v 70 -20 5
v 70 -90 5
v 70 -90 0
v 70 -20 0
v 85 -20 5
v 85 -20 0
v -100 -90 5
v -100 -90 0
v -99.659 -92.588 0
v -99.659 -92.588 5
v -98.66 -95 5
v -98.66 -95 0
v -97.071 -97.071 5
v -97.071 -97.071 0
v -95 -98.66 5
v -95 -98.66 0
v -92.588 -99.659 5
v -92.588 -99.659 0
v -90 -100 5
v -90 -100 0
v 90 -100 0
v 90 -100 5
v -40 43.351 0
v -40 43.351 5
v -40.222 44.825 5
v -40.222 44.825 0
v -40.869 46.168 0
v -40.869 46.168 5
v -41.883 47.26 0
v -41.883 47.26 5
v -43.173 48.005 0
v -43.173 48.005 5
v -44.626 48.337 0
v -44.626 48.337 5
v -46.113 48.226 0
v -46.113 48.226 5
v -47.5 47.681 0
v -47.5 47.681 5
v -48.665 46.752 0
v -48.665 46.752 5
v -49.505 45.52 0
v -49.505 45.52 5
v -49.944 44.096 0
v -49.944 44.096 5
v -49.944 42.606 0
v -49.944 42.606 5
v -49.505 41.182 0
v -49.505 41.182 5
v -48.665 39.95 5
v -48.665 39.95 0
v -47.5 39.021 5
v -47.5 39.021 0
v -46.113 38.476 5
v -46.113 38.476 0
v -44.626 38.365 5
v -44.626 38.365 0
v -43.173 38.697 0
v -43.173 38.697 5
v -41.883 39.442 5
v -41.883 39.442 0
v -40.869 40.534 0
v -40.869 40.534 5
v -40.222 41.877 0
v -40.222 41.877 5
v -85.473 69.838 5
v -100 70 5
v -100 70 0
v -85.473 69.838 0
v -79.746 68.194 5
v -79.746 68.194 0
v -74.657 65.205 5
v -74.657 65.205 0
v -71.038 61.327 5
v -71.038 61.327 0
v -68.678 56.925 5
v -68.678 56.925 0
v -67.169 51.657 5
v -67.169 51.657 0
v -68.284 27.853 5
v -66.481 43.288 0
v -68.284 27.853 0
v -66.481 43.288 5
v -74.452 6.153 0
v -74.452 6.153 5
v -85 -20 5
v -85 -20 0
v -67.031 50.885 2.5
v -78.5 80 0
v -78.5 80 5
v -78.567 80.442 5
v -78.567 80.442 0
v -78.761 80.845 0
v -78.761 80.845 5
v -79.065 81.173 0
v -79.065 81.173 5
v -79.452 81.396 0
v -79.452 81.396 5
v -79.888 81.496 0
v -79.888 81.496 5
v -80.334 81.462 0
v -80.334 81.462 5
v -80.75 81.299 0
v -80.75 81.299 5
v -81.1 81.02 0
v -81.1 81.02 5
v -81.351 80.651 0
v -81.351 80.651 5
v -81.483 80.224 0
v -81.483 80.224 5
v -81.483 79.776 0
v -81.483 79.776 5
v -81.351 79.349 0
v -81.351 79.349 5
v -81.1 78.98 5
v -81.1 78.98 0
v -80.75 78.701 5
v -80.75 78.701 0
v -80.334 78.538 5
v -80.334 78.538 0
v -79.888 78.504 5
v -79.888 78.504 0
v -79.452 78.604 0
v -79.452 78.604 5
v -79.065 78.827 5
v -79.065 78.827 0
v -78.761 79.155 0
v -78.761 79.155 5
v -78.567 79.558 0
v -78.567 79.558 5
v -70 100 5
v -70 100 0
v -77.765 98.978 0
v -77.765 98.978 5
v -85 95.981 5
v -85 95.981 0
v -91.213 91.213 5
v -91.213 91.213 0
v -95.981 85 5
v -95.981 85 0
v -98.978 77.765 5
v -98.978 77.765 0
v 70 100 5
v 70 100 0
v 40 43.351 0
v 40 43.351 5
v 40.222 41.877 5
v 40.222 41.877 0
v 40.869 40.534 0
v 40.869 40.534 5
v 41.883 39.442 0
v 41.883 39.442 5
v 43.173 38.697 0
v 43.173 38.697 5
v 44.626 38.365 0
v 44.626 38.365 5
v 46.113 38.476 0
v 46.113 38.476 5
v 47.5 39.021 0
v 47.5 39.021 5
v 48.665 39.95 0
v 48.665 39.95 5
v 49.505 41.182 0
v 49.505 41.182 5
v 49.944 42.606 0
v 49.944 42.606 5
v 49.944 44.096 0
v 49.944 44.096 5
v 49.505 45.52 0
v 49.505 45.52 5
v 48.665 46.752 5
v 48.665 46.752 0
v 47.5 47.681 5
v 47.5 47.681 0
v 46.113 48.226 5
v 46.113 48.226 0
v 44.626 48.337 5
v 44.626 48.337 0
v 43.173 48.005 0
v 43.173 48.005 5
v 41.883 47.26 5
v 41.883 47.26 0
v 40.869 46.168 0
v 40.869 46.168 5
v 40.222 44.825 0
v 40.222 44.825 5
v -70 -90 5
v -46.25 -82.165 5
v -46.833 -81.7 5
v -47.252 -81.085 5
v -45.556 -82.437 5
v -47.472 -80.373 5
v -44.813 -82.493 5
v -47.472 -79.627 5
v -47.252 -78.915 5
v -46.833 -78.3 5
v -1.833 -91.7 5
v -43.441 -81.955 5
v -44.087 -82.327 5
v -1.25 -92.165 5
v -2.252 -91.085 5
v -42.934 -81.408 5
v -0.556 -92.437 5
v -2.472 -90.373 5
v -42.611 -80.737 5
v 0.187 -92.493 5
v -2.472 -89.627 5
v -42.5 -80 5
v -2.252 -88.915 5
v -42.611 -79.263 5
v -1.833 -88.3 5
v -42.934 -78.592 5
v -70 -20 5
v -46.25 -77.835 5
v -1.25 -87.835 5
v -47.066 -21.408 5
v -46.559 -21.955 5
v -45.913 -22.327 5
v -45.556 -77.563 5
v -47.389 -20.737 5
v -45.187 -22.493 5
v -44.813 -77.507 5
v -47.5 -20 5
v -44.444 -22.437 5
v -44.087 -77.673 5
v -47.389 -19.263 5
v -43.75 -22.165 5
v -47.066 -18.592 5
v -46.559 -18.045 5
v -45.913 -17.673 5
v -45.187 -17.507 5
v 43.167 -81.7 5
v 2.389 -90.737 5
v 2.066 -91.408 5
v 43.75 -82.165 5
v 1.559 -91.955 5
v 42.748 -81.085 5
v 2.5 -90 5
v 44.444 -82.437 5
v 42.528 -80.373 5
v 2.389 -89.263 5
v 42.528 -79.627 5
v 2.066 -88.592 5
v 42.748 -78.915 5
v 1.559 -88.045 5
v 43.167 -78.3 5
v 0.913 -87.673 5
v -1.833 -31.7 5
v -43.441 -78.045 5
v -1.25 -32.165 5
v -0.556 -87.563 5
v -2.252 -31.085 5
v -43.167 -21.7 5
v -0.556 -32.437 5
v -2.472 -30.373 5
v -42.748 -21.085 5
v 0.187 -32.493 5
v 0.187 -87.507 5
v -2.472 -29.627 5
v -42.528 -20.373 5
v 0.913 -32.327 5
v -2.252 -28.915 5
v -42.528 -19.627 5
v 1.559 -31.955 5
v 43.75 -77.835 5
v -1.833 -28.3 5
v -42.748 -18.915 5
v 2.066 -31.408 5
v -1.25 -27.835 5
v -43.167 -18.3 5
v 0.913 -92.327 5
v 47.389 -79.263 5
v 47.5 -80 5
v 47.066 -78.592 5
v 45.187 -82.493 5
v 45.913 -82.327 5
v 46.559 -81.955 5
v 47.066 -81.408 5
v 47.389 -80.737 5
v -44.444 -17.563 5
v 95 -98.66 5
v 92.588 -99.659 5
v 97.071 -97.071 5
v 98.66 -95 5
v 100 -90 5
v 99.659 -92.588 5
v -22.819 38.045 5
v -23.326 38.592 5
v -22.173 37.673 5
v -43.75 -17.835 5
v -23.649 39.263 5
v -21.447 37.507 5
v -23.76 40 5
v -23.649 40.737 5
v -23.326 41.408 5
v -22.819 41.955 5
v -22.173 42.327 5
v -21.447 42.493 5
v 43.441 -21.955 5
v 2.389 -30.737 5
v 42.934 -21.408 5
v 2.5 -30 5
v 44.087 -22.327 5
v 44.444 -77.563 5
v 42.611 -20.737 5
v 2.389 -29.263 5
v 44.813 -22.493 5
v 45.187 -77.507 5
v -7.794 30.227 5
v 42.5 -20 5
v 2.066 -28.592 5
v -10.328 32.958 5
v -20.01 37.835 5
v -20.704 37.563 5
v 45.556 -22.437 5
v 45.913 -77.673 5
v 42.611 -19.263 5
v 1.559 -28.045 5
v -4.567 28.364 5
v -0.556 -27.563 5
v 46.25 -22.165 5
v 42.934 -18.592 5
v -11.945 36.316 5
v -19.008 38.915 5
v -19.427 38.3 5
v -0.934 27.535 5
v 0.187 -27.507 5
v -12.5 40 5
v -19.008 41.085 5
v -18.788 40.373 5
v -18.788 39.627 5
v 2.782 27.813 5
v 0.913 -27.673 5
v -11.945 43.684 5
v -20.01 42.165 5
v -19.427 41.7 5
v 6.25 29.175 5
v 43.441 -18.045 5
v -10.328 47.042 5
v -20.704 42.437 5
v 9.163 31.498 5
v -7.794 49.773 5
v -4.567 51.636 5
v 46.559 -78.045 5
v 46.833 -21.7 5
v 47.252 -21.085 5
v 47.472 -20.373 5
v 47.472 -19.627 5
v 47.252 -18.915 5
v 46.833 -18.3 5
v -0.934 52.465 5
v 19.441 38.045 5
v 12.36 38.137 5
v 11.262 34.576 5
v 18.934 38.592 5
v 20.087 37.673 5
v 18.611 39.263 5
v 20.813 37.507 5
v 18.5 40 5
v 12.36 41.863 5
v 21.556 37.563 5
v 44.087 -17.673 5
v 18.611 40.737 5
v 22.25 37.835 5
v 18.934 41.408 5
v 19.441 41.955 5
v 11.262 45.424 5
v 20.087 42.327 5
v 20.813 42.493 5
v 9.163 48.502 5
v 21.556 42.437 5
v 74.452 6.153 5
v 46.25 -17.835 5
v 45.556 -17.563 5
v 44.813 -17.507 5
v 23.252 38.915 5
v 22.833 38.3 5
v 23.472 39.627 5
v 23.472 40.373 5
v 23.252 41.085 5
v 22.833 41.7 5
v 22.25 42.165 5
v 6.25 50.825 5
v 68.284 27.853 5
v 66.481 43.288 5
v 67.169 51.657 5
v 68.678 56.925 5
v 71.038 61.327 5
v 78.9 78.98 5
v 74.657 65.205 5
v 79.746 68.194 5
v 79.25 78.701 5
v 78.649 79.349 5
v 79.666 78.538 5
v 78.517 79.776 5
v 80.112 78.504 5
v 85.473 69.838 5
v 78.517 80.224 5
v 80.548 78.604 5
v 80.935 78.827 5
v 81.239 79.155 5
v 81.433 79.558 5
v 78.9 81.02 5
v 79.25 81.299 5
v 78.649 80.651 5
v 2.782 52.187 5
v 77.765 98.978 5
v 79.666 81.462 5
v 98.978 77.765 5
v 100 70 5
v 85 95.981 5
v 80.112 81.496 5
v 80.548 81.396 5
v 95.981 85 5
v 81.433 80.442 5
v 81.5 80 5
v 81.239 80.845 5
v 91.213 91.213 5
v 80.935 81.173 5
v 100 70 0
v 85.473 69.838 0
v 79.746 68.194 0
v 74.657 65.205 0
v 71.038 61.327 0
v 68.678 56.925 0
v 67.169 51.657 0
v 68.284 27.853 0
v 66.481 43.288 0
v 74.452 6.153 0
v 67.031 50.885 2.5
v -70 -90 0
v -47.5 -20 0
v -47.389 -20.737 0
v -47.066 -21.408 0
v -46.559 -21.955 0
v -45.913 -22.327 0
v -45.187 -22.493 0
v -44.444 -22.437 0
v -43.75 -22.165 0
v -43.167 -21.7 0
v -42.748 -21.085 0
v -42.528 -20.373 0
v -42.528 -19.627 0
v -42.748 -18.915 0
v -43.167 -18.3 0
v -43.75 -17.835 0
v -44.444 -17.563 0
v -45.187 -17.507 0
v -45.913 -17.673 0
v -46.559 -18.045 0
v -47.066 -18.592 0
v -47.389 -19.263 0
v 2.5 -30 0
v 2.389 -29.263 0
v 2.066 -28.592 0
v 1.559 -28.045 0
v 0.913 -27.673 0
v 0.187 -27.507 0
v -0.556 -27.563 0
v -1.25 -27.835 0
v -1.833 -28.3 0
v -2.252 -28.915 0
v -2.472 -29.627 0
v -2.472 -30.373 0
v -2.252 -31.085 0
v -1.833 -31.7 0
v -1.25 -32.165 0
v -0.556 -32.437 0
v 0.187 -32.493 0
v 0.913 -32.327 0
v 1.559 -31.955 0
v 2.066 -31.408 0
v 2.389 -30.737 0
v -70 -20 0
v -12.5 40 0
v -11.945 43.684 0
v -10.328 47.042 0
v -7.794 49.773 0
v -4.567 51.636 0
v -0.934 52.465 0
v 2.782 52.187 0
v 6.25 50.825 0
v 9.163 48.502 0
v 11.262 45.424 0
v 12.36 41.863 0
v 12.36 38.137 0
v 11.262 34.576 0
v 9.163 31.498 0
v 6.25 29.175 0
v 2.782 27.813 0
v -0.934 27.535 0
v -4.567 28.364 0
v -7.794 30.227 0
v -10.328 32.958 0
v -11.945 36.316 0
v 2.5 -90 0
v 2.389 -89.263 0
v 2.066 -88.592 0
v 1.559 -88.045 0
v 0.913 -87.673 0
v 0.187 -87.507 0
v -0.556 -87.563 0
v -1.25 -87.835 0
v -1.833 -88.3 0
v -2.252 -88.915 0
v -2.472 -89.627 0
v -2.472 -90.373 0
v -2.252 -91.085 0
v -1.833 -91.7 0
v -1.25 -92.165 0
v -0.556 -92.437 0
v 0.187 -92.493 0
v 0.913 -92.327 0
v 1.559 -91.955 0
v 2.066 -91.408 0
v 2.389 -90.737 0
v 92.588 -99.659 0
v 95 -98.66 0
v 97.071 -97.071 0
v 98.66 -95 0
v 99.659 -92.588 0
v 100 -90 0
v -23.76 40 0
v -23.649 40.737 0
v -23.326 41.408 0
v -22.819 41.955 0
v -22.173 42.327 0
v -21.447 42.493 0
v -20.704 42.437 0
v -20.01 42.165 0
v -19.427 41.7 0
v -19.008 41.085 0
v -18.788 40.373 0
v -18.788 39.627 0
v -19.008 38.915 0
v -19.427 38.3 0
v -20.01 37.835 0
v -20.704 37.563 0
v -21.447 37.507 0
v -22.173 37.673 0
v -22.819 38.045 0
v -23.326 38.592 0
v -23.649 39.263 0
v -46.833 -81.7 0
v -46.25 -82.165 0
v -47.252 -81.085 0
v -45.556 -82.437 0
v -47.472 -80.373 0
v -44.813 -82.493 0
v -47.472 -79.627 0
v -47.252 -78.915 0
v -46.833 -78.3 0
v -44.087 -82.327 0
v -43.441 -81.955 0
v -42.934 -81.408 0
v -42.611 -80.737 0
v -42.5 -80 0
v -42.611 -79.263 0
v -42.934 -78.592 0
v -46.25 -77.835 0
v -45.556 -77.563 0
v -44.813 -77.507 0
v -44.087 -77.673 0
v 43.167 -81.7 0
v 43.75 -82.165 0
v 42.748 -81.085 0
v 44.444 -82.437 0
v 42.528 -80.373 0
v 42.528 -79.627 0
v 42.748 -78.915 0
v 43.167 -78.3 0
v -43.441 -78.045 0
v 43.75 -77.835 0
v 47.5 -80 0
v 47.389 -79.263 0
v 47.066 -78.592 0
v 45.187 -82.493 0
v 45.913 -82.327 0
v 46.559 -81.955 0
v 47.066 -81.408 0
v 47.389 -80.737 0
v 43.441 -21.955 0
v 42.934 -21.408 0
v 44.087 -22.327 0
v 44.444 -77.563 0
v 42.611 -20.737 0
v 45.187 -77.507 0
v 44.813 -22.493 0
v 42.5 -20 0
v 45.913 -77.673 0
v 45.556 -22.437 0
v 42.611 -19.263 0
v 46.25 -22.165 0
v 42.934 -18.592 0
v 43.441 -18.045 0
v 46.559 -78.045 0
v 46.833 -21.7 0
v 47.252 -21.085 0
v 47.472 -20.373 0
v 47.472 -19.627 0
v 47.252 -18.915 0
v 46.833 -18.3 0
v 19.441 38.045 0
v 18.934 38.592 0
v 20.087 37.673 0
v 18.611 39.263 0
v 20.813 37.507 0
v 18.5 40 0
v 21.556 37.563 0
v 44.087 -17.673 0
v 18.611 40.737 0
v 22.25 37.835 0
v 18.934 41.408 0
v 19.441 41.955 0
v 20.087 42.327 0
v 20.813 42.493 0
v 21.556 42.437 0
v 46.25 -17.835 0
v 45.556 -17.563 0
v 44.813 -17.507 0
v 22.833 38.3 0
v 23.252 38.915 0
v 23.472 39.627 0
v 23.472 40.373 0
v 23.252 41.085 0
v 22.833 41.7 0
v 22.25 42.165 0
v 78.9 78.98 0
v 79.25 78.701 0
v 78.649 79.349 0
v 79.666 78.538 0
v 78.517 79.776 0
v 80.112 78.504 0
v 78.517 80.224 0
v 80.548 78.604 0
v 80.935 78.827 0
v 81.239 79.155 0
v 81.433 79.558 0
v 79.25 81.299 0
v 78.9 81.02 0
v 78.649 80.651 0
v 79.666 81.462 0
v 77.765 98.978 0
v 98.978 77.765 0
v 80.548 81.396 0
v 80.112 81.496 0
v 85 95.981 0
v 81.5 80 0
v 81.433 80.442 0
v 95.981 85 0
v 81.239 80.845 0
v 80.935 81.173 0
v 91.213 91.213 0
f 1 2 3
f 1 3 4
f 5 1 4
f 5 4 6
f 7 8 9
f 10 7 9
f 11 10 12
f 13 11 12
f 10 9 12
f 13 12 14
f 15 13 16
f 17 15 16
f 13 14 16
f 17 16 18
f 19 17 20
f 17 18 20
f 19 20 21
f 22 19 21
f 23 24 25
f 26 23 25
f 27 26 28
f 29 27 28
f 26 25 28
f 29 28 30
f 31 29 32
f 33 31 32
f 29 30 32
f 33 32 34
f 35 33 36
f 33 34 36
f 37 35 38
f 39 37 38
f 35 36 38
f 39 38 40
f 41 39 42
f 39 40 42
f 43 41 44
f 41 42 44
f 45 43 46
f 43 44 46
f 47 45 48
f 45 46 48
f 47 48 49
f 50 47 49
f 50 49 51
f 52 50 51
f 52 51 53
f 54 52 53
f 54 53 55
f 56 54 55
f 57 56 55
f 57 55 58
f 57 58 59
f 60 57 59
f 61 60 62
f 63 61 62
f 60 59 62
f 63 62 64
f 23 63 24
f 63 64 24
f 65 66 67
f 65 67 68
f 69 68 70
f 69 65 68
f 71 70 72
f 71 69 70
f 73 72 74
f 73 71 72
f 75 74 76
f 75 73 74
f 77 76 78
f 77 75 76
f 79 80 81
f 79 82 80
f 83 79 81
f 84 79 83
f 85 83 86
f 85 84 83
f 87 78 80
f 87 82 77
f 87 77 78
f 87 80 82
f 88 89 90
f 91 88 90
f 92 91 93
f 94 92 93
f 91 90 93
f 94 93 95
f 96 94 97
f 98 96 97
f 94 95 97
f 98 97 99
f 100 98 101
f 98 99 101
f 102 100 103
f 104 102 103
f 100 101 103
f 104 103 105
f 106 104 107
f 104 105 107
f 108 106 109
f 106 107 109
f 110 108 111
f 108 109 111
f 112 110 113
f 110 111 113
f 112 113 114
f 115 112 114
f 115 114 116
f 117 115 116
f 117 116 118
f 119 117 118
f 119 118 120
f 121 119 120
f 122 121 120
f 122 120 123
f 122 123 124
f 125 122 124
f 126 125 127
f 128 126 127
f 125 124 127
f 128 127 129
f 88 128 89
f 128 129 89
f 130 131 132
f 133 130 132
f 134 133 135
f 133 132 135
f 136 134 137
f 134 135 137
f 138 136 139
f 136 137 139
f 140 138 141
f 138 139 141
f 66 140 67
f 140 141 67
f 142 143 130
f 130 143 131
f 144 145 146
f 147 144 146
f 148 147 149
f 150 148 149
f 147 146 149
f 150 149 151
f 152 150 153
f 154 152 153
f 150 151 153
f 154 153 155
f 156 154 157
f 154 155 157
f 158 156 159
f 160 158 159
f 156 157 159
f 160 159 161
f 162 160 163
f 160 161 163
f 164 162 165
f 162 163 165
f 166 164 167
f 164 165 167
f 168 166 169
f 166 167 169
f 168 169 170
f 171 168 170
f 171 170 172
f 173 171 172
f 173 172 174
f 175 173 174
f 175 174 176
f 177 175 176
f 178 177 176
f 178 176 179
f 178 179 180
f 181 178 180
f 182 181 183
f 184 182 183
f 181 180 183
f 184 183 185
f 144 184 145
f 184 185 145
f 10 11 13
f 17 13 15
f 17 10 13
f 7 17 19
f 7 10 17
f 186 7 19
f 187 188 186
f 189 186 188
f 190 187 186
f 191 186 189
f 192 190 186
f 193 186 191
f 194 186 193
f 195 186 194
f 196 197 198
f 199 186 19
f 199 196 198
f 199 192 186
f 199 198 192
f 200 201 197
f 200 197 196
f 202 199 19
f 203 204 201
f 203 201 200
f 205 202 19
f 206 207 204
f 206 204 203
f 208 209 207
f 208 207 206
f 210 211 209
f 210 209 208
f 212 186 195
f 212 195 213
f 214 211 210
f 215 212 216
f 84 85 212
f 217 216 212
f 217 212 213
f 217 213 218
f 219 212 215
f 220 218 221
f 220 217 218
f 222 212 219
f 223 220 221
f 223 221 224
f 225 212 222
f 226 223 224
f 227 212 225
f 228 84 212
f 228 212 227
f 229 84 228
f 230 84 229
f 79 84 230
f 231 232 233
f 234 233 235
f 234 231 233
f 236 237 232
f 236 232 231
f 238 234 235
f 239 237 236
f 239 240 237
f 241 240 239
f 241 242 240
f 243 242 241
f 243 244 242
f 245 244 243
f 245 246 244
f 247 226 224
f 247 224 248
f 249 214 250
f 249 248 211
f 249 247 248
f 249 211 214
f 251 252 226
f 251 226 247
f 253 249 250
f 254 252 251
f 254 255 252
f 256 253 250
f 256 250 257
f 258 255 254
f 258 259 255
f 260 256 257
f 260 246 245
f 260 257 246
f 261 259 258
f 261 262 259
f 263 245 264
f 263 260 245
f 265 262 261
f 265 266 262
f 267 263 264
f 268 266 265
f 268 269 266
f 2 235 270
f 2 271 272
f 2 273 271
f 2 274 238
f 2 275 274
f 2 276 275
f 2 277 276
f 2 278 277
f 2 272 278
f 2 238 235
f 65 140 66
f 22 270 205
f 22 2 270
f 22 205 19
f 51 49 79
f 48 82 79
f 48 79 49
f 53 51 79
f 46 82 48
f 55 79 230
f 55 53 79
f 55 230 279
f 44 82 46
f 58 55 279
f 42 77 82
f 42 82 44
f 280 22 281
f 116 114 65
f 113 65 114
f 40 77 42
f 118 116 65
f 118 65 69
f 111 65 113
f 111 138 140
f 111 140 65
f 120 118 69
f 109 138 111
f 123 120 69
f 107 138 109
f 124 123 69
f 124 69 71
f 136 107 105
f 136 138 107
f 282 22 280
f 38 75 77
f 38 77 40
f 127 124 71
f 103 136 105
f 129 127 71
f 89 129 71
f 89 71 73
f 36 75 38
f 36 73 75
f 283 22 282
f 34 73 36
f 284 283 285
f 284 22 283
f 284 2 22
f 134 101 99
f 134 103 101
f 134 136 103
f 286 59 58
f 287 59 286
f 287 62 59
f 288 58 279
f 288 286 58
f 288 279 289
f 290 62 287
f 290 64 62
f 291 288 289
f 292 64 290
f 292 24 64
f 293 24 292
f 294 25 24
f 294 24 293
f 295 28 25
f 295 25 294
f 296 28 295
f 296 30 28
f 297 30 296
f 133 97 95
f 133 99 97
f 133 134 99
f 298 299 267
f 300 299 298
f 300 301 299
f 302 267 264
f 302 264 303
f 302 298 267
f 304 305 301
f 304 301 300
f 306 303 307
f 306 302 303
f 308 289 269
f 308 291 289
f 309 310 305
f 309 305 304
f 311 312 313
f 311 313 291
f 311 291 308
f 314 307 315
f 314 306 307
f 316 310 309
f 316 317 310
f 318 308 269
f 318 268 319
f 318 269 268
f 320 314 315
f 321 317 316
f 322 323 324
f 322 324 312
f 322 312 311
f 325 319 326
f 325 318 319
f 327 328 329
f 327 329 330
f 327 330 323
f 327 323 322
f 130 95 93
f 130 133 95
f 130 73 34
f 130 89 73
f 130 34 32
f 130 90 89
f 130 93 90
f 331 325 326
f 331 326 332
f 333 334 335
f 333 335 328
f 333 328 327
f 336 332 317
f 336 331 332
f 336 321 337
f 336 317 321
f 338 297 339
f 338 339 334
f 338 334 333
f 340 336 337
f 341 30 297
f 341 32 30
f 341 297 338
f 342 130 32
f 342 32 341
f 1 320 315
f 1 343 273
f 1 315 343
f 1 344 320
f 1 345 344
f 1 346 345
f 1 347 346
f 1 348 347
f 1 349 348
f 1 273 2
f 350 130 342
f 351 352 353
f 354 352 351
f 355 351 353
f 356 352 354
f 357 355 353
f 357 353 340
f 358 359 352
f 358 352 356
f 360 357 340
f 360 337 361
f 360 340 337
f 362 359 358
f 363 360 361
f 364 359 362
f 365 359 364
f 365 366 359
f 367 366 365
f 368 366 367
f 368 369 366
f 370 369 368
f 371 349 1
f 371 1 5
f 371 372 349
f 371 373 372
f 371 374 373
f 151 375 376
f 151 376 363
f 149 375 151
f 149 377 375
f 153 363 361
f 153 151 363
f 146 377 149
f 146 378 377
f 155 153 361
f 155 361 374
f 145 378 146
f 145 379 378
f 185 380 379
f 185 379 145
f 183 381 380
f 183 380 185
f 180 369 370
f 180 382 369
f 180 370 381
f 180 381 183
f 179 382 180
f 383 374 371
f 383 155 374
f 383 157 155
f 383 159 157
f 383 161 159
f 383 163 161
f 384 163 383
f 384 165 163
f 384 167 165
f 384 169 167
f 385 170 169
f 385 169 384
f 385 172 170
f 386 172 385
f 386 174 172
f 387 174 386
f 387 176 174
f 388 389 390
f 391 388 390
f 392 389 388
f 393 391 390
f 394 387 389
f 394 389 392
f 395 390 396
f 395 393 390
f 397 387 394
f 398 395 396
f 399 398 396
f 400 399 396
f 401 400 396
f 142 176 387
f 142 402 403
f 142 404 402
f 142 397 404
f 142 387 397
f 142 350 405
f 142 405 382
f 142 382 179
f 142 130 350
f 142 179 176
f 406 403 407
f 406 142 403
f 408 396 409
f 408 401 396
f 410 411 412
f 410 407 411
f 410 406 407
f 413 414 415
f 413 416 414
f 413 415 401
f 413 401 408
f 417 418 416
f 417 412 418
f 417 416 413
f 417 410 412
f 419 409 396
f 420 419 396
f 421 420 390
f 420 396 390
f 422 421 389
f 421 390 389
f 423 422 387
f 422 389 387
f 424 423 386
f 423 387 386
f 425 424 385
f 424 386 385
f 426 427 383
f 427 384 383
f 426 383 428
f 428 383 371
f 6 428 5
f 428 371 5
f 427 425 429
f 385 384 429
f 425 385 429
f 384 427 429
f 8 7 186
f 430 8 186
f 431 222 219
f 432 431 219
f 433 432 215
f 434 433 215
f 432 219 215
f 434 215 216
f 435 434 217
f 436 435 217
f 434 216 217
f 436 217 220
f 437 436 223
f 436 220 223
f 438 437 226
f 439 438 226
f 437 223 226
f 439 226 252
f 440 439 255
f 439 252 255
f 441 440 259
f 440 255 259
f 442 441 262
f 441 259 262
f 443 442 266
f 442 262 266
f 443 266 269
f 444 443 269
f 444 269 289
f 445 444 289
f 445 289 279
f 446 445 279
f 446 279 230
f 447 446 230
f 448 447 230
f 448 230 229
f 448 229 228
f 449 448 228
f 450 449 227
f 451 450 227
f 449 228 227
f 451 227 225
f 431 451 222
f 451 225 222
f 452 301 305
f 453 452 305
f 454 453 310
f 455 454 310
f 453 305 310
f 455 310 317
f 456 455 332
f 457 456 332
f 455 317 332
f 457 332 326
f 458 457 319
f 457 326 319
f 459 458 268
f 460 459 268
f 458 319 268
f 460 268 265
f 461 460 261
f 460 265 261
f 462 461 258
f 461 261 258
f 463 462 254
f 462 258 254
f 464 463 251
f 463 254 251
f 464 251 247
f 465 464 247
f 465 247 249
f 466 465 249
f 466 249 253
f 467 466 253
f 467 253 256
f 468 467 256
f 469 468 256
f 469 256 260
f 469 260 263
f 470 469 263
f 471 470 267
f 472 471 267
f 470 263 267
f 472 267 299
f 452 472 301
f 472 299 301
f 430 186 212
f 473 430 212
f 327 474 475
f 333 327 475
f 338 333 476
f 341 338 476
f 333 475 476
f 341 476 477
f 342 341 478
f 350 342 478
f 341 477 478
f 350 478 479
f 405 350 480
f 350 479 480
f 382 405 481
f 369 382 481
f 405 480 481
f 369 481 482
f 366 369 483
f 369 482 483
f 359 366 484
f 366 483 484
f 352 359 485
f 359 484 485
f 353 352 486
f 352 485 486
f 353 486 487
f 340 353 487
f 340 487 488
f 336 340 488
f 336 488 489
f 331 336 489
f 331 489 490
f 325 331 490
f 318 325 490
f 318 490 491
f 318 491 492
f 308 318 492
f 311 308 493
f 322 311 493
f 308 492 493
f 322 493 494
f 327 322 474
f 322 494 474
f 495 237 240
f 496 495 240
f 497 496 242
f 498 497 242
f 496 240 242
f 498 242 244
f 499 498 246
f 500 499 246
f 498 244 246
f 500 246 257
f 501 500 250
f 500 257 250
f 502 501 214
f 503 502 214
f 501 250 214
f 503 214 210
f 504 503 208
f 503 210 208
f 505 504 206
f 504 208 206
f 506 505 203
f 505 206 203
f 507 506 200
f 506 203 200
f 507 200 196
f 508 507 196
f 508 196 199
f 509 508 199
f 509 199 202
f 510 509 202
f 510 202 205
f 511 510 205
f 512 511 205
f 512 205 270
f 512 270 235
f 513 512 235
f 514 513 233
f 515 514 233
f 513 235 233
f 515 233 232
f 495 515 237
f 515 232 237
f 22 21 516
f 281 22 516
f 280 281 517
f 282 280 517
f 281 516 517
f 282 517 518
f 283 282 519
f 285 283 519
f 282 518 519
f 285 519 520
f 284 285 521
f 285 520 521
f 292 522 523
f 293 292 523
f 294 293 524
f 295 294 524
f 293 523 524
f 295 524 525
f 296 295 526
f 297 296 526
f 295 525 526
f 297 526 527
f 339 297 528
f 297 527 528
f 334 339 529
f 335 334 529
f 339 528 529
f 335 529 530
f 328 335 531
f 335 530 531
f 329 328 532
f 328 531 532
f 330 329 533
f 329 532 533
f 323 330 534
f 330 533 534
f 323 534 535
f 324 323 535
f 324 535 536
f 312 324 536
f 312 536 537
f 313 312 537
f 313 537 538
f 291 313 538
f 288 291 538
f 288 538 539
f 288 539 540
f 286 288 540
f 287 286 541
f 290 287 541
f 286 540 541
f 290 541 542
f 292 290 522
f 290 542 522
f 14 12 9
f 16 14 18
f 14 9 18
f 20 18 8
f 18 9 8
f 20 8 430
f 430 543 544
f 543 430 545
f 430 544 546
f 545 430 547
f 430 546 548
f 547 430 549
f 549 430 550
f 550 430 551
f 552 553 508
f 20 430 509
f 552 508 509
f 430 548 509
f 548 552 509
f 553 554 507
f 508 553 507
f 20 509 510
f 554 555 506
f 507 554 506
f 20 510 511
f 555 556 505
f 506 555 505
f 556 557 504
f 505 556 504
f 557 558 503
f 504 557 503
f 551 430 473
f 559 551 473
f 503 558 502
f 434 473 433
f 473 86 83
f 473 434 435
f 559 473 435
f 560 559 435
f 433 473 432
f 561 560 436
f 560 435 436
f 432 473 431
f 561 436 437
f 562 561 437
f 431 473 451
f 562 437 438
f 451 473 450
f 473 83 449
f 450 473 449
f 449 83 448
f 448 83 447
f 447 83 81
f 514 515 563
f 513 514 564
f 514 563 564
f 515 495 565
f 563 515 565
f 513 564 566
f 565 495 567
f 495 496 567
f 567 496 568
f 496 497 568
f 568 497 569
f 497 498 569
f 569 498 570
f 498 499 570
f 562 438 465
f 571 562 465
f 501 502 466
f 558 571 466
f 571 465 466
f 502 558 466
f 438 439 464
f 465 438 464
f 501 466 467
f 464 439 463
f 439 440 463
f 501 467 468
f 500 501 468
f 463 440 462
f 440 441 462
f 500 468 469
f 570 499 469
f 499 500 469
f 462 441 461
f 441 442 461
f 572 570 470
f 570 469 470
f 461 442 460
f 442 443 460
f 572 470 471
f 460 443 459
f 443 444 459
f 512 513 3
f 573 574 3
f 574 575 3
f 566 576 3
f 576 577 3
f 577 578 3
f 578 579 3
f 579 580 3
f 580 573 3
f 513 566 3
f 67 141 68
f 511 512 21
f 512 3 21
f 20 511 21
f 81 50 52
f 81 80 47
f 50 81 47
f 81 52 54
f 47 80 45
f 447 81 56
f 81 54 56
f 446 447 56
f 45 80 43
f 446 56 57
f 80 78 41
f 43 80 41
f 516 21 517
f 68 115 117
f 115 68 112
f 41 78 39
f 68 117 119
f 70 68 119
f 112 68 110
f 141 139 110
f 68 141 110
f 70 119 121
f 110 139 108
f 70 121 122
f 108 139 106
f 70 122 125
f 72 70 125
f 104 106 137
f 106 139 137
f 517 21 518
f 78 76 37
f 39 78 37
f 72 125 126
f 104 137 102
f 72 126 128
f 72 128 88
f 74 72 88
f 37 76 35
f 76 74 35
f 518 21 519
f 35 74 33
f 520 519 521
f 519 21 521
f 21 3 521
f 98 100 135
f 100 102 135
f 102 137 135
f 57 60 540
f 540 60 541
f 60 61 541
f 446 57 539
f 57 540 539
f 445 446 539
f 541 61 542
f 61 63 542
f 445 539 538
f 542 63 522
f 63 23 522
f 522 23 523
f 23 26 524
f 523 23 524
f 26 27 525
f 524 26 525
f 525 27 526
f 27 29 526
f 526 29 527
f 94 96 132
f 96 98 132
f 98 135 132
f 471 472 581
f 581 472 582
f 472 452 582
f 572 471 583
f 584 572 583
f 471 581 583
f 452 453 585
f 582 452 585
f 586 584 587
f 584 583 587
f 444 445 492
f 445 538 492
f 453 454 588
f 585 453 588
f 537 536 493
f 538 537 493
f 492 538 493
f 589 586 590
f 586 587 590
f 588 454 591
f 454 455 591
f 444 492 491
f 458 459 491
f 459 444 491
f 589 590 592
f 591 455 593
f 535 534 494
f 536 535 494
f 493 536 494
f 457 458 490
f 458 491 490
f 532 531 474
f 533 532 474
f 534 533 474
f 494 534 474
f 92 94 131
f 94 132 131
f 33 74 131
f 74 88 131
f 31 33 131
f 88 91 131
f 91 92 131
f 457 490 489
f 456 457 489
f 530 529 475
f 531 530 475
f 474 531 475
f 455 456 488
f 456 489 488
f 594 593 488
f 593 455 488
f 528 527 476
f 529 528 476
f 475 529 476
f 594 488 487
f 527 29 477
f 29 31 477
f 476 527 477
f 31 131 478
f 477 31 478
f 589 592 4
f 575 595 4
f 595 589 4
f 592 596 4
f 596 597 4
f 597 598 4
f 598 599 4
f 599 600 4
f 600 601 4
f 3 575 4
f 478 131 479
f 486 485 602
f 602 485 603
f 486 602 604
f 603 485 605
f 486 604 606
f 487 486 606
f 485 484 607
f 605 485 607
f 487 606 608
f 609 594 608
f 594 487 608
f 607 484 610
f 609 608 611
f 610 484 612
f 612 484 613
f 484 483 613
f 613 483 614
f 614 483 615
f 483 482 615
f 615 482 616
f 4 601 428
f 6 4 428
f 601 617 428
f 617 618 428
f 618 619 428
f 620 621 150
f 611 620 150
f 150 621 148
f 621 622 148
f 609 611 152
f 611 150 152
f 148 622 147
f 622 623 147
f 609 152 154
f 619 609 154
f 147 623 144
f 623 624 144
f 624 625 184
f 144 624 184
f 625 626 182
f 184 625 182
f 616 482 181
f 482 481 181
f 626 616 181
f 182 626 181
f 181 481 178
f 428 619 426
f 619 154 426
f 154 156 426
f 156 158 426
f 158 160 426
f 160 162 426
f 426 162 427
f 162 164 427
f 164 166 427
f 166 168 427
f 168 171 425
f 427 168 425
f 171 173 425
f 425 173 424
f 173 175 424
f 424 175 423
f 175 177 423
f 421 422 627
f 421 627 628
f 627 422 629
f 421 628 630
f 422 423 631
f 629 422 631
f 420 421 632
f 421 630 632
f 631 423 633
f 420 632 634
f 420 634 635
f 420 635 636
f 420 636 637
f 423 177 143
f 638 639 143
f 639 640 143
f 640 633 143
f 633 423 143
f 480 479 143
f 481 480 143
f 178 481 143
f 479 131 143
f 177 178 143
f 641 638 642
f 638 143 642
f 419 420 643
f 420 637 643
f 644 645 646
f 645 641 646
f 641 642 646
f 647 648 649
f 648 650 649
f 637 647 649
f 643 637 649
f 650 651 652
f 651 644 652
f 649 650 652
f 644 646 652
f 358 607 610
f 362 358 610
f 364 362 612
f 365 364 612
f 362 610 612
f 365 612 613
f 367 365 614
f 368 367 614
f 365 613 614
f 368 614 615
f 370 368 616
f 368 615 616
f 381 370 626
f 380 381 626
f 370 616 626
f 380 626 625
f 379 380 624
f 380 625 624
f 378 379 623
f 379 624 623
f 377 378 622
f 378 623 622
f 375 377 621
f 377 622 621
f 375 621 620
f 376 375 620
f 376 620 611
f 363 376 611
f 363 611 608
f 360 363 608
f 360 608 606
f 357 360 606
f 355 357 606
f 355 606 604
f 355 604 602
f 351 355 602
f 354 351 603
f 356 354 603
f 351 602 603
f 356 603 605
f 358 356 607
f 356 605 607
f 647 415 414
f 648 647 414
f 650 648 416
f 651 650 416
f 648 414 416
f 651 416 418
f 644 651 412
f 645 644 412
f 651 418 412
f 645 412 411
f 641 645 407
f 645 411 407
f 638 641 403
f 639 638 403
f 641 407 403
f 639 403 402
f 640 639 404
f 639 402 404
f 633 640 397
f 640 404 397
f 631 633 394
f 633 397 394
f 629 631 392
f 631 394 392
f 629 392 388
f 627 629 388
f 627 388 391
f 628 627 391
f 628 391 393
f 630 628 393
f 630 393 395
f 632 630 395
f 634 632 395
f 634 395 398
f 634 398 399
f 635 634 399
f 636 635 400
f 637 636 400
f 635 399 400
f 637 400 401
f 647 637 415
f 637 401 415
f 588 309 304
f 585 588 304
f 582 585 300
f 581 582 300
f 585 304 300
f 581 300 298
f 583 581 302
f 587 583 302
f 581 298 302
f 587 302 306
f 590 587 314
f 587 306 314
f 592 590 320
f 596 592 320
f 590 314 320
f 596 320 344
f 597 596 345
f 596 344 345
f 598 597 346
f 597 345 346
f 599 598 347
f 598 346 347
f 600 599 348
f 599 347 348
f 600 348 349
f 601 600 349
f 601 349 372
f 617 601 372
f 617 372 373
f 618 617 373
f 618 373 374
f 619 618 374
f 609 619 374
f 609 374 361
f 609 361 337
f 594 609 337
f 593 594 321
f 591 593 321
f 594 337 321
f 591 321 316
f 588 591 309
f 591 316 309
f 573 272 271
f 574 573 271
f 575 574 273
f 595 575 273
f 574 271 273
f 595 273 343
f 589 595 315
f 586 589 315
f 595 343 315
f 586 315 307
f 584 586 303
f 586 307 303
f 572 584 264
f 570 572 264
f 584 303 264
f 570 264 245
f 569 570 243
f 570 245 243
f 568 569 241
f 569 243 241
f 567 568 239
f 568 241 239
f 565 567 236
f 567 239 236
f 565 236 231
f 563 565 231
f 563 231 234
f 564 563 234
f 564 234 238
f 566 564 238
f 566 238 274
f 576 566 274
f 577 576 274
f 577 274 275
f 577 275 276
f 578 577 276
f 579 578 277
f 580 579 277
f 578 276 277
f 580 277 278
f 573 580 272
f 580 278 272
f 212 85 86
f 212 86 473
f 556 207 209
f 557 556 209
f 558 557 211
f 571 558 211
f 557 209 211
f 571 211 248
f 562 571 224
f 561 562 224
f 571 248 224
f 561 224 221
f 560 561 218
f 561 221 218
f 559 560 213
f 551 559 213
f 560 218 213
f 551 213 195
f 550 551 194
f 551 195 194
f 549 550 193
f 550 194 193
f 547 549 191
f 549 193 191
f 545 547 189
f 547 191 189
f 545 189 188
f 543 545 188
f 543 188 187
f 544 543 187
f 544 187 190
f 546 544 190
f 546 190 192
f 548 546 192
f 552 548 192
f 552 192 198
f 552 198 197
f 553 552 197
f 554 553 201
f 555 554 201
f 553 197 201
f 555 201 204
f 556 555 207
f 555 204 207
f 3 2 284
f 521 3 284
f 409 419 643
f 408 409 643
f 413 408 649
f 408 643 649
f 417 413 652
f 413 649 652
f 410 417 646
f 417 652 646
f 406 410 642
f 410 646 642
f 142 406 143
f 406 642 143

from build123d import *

# Parameters (mm, degrees)
BOSS_EXTRUDE1_DEPTH = 5
SKETCH2_W           = 30
SKETCH2_H           = 70
CUT_EXTRUDE1_DEPTH  = 5
CUT_EXTRUDE2_DEPTH  = 5
SKETCH5_R           = 2.5
SKETCH5_R_2         = 5
CUT_EXTRUDE3_DEPTH  = 5
SKETCH6_R           = 2.5
CUT_EXTRUDE4_DEPTH  = 5
SKETCH7_R           = 12.5
SKETCH7_R_2         = 2.5
CUT_EXTRUDE5_DEPTH  = 5
SKETCH8_R           = 1.5
CUT_EXTRUDE6_DEPTH  = 5


with BuildPart() as part:
    # Sketch1 → Boss-Extrude1 (new body)
    with BuildSketch(Plane.XY):
        with BuildLine():
            Line((-90, -100), (90, -100))
            ThreePointArc((90, -100), (97.071067812, -97.071067812), (100, -90))
            Line((100, -90), (100, 70))
            ThreePointArc((100, 70), (91.213203436, 91.213203436), (70, 100))
            Line((70, 100), (-70, 100))
            ThreePointArc((-70, 100), (-91.213203436, 91.213203436), (-100, 70))
            Line((-100, 70), (-100, -90))
            ThreePointArc((-100, -90), (-97.071067812, -97.071067812), (-90, -100))
        make_face()
    extrude(amount=BOSS_EXTRUDE1_DEPTH)

    # Sketch2 → Cut-Extrude1 (cut)
    with BuildSketch(Plane.XY.offset(5)):
        with Locations((85, -55)):
            Rectangle(SKETCH2_W, SKETCH2_H)
        with Locations((-85, -55)):
            Rectangle(SKETCH2_W, SKETCH2_H)
    extrude(amount=-CUT_EXTRUDE1_DEPTH, mode=Mode.SUBTRACT)

    # Sketch3 → Cut-Extrude2 (cut)
    with BuildSketch(Plane.XY.offset(5)):
        with BuildLine():
            Line((85, -20), (100, -20))
            Line((100, -20), (100, 70))
            add(Edge.make_bspline(
                [(100, 70), (41.562750789, 76.769648156), (85, -20)],
                knots=[0, 0, 0, 1, 1, 1], degree=2))
        make_face()
        with BuildLine():
            Line((-85, -20), (-100, -20))
            Line((-100, -20), (-100, 70))
            add(Edge.make_bspline(
                [(-100, 70), (-41.562750789, 76.769648156), (-85, -20)],
                knots=[0, 0, 0, 1, 1, 1], degree=2))
        make_face()
    extrude(amount=-CUT_EXTRUDE2_DEPTH, mode=Mode.SUBTRACT)

    # Sketch5 → Cut-Extrude3 (cut)
    with BuildSketch(Plane.XY.offset(5)):
        with Locations((45, -80)):
            Circle(SKETCH5_R)
        with Locations((-45, -80)):
            Circle(SKETCH5_R)
        with Locations(Location((45, -20, 0), (0, 0, 180))):
            Circle(SKETCH5_R)
        with Locations(Location((-45, -20, 0), (0, 0, 180))):
            Circle(SKETCH5_R)
        with Locations((-45, 43.350998567)):
            Circle(SKETCH5_R_2)
        with Locations(Location((45, 43.350998567, 0), (0, 0, 180))):
            Circle(SKETCH5_R_2)
        with Locations((0, -30)):
            Circle(SKETCH5_R)
    extrude(amount=-CUT_EXTRUDE3_DEPTH, mode=Mode.SUBTRACT)

    # Sketch6 → Cut-Extrude4 (cut)
    with BuildSketch(Plane.XY.offset(5)):
        with Locations((0, -90)):
            Circle(SKETCH6_R)
    extrude(amount=-CUT_EXTRUDE4_DEPTH, mode=Mode.SUBTRACT)

    # Sketch7 → Cut-Extrude5 (cut)
    with BuildSketch(Plane(origin=(0, 0, 0), x_dir=(-1, 0, 0), z_dir=(0, 0, -1))):
        with Locations((0, 40)):
            Circle(SKETCH7_R)
        with Locations((-21, 40)):
            Circle(SKETCH7_R_2)
        with Locations((21.26, 40)):
            Circle(SKETCH7_R_2)
    extrude(amount=-CUT_EXTRUDE5_DEPTH, mode=Mode.SUBTRACT)

    # Sketch8 → Cut-Extrude6 (cut)
    with BuildSketch(Plane.XY.offset(5)):
        with Locations((-80, 80)):
            Circle(SKETCH8_R)
        with Locations((80, 80)):
            Circle(SKETCH8_R)
    extrude(amount=-CUT_EXTRUDE6_DEPTH, mode=Mode.SUBTRACT)


solid = part.part
